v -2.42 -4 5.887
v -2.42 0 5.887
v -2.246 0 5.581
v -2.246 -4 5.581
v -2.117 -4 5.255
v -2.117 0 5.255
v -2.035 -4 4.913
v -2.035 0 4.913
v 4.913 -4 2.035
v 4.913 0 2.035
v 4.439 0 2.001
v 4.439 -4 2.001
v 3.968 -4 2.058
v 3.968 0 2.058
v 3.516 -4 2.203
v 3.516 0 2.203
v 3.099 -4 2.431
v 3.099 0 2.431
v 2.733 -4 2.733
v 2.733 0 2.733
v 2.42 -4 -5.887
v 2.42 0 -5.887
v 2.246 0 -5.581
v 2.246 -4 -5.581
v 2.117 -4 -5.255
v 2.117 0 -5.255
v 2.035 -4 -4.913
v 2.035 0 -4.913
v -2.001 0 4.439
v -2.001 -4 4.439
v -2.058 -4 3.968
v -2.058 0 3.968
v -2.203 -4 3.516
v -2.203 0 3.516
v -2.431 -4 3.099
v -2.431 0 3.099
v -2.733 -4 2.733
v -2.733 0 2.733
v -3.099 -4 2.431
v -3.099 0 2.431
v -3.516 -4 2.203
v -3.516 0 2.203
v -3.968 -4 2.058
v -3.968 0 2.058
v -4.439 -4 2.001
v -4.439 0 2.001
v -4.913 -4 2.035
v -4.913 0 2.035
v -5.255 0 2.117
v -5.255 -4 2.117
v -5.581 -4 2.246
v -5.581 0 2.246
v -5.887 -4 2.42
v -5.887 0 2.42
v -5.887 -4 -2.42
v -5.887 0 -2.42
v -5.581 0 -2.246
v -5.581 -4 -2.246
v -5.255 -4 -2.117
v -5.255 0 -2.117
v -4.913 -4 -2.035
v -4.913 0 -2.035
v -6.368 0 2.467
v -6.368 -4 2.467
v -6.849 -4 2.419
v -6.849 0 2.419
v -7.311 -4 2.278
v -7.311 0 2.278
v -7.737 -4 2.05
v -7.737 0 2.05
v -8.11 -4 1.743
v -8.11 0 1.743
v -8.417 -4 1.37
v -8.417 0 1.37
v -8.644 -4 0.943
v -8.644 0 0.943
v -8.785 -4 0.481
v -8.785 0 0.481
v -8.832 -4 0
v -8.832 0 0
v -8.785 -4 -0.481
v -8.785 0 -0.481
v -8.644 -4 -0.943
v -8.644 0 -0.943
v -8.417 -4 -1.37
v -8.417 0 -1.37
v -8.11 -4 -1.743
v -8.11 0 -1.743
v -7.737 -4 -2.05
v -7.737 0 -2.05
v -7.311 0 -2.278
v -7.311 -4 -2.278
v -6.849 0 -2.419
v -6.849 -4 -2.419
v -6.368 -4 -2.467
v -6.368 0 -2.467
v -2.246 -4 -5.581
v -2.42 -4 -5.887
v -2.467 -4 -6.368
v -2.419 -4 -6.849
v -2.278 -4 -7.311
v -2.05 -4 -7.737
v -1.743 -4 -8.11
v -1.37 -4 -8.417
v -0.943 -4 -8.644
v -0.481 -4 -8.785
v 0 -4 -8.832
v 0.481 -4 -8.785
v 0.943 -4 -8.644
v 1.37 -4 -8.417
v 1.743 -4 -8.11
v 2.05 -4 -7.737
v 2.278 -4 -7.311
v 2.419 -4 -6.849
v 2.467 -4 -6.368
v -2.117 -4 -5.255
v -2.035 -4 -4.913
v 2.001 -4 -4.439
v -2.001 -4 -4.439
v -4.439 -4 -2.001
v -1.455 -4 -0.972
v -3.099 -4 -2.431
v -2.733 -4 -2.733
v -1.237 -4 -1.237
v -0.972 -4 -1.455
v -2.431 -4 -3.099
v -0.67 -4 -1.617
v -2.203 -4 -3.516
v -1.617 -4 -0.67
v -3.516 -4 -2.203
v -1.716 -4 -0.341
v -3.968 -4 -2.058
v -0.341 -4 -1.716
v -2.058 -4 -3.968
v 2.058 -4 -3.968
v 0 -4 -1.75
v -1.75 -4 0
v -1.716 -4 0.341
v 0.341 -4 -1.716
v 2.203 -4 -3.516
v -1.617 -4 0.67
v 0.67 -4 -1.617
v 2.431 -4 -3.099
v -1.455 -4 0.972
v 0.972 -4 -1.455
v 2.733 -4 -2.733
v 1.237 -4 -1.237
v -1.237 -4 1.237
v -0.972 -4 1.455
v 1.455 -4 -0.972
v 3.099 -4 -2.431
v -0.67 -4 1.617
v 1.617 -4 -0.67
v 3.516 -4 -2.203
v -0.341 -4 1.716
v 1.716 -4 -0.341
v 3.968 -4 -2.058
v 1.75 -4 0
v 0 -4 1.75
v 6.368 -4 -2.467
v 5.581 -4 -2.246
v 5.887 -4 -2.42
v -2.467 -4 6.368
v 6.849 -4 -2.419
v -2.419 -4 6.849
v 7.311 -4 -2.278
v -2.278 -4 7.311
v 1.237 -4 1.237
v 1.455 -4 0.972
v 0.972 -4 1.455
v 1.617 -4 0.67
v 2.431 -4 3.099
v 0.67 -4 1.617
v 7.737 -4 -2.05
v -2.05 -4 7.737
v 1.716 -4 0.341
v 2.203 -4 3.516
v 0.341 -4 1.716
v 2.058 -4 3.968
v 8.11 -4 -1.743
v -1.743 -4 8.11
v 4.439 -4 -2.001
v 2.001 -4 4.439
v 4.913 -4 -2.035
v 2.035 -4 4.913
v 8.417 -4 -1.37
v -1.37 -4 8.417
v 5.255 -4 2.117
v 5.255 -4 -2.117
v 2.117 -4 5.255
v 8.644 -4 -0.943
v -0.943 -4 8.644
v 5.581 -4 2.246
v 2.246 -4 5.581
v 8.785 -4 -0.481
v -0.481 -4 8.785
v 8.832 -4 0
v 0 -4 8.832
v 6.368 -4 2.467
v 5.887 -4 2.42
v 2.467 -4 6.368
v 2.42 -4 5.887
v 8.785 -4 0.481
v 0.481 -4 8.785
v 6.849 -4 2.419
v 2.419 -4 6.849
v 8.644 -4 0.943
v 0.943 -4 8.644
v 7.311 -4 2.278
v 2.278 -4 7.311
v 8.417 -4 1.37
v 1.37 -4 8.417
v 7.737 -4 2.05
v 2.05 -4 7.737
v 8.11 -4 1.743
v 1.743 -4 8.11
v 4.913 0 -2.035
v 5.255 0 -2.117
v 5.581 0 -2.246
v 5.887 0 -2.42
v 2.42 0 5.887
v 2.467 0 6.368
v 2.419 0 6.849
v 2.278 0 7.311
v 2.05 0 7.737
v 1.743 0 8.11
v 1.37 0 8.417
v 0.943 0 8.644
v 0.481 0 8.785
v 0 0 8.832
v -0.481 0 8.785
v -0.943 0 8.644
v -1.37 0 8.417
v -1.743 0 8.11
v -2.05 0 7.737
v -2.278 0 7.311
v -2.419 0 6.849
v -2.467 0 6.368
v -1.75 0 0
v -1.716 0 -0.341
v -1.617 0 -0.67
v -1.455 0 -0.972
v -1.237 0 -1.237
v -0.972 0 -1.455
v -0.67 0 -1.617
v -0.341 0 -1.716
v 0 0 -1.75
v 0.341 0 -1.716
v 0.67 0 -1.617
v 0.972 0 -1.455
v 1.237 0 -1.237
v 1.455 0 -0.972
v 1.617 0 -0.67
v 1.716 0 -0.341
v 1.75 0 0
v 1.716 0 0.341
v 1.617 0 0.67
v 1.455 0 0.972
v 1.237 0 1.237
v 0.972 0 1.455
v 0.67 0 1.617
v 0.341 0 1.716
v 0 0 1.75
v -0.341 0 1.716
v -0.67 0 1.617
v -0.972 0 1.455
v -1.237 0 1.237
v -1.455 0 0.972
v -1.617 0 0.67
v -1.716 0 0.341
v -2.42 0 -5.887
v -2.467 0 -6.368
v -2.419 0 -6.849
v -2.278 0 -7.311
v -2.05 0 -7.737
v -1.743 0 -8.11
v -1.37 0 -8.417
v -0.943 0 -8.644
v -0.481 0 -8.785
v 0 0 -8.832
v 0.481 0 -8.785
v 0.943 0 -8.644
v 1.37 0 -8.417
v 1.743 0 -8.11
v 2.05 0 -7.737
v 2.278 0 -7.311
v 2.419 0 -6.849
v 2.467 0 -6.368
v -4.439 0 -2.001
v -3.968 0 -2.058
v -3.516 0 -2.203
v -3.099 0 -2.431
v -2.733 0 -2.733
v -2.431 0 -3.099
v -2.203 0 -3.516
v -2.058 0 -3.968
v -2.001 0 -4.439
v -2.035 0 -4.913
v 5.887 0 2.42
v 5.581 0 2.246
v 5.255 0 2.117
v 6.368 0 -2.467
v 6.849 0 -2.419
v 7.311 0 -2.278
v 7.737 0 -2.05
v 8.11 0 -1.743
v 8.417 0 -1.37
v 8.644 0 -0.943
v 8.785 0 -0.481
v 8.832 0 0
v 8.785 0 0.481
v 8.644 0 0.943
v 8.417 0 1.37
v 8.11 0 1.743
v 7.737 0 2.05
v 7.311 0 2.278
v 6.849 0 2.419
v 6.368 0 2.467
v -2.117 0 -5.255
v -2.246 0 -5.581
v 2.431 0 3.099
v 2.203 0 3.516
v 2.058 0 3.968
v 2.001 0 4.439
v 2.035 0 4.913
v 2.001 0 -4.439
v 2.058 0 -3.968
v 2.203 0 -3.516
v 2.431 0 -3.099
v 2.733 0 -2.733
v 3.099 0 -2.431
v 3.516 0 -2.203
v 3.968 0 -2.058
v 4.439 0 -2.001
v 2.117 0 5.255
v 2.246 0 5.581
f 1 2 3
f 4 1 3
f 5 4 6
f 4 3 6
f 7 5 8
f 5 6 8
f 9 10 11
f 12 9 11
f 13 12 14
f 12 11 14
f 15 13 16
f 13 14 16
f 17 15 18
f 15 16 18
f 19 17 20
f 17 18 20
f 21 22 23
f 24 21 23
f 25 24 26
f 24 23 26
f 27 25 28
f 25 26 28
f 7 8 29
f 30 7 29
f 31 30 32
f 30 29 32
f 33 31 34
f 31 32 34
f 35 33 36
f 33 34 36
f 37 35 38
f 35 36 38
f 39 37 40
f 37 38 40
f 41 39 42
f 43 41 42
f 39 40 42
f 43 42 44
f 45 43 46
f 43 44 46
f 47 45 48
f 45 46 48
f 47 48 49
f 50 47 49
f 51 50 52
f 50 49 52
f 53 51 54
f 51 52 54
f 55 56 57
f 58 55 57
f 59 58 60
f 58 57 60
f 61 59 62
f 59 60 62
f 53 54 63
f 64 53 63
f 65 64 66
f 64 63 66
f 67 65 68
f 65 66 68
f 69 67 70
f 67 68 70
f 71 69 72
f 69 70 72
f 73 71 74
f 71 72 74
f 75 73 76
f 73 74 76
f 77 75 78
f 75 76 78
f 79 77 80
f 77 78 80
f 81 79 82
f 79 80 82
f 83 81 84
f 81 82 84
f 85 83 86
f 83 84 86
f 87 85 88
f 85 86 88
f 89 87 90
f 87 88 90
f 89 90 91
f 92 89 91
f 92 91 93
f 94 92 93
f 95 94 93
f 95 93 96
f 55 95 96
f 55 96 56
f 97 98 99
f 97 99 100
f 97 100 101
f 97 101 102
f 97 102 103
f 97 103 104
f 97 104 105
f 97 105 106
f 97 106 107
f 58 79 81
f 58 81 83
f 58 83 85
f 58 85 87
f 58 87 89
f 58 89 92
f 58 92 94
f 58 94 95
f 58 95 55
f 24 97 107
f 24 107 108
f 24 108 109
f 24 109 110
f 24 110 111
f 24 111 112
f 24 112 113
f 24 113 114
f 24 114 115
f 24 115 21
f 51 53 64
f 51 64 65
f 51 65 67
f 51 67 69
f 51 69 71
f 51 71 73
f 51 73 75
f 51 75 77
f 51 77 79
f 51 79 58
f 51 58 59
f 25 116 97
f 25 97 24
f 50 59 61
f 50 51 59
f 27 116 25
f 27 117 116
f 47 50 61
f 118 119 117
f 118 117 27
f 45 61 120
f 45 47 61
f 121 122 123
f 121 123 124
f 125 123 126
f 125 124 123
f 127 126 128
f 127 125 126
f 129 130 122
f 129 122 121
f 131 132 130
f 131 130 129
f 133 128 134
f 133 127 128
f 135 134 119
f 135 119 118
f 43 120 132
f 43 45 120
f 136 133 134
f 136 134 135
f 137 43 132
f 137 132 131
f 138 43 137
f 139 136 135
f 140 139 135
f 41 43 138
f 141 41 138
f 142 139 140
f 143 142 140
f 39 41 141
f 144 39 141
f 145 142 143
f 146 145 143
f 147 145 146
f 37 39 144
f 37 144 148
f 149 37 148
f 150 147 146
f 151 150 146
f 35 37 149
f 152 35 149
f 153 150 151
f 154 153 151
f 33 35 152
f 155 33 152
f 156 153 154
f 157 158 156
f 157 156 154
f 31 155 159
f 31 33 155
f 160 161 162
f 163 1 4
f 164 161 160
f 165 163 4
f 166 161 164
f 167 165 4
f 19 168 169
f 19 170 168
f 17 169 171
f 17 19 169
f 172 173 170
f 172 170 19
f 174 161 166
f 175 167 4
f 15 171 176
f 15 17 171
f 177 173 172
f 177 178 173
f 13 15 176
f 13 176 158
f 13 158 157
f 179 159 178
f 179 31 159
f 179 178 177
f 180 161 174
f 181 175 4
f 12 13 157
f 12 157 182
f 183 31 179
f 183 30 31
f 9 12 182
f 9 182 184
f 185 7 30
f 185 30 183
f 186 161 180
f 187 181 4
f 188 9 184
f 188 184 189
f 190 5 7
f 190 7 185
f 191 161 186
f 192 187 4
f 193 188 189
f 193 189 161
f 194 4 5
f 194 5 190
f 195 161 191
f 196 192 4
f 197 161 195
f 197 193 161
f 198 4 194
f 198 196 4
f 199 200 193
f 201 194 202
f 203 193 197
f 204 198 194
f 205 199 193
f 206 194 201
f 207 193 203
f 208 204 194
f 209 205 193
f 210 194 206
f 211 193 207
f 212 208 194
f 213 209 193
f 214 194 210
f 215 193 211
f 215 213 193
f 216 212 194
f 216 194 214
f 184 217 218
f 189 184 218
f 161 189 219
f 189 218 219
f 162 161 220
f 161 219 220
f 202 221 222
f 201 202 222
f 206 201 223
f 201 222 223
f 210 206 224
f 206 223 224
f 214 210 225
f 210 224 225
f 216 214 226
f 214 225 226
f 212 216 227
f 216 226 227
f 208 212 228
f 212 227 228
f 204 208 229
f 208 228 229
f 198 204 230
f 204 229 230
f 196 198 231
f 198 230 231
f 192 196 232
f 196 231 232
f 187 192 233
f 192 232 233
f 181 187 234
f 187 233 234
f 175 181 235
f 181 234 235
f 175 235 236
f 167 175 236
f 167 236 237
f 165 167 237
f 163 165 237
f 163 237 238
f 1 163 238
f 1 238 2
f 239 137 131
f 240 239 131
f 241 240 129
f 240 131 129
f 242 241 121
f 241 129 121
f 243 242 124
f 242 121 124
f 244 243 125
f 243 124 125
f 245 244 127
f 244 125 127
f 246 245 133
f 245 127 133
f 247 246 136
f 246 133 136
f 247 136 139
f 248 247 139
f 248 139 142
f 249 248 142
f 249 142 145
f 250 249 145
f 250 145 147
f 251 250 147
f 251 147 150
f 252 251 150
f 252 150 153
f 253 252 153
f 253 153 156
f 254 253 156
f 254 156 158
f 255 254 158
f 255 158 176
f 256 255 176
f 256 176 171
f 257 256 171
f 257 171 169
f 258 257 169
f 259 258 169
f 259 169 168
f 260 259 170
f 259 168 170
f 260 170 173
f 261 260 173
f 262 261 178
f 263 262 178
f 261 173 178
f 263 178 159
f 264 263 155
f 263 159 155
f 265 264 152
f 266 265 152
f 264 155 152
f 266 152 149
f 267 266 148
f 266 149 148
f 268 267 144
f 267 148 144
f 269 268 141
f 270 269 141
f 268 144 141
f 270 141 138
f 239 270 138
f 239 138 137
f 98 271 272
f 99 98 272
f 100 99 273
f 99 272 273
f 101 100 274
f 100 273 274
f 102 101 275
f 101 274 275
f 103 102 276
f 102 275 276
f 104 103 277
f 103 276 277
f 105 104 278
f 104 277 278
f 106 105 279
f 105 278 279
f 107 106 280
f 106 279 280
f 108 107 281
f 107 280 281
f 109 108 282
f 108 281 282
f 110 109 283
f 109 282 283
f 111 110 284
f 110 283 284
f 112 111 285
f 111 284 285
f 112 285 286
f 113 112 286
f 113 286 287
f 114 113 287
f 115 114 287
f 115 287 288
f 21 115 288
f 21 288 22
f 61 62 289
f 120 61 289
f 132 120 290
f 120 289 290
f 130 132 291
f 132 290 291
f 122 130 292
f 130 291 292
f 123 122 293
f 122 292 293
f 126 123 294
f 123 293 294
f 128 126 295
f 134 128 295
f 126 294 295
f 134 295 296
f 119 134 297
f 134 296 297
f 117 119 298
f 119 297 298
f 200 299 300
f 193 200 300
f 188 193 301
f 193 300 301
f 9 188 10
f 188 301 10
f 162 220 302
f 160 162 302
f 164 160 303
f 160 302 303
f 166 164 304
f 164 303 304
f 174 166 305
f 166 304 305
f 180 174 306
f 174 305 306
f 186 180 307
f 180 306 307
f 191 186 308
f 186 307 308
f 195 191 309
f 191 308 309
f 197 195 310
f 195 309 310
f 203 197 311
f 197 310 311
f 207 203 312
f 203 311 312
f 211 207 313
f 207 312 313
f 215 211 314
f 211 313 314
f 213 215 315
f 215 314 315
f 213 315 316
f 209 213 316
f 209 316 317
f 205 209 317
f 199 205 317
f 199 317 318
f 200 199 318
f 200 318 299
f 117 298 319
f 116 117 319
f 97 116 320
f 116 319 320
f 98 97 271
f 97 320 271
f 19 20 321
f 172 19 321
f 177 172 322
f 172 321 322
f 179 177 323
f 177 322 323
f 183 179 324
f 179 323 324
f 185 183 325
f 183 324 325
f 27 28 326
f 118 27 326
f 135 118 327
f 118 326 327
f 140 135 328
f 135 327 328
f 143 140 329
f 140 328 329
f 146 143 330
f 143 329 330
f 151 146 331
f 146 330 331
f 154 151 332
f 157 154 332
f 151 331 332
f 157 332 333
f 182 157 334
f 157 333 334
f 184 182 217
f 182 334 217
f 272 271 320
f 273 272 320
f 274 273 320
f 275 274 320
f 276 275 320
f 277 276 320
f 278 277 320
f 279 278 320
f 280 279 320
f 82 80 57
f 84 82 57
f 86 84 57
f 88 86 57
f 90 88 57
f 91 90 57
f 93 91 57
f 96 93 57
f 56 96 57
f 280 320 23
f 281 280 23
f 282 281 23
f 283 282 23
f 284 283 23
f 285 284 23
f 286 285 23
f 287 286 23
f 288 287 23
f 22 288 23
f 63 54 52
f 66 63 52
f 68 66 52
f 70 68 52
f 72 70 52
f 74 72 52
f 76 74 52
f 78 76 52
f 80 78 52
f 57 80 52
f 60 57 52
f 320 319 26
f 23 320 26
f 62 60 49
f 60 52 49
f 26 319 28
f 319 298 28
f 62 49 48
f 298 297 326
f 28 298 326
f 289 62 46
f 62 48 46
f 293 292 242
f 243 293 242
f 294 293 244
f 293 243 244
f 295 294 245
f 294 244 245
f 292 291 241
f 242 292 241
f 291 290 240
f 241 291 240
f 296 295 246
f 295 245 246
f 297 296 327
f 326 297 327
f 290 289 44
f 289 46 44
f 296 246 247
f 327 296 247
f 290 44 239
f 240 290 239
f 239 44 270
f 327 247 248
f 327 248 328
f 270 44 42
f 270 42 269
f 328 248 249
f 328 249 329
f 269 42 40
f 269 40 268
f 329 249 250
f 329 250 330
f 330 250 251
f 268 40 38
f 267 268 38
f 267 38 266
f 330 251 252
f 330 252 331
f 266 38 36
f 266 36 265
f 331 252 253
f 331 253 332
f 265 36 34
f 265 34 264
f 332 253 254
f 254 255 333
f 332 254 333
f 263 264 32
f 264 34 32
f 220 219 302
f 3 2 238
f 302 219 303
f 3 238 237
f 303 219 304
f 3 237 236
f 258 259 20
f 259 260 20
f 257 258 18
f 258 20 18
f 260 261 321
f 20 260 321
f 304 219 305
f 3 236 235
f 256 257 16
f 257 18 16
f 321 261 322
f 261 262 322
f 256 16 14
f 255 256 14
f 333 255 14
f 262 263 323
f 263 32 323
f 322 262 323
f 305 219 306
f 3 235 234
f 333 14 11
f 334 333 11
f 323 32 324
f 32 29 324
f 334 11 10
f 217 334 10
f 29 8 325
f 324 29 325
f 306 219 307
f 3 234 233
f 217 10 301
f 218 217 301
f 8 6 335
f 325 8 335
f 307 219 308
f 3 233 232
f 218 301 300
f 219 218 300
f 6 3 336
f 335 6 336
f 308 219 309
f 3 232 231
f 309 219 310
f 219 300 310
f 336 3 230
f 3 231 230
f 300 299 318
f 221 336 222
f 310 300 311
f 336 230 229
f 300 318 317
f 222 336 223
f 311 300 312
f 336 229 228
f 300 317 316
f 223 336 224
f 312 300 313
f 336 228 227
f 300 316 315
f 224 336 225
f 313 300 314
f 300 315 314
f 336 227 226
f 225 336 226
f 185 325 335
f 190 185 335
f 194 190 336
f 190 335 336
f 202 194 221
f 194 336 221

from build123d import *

# Parameters (mm, degrees)
F1_DEPTH = 4
F2_D     = 3.5


with BuildPart() as f1:
    # F0 (on Front) → F1 (new body)
    with BuildSketch(Plane.XZ):
        with BuildLine():
            ThreePointArc((-5.886911578, 2.4202266574), (-8.8319952599, 0), (-5.886911578, -2.4202266574))
            ThreePointArc((-5.886911578, -2.4202266574), (-6.365, 0), (-5.886911578, 2.4202266574))
        make_face()
        with BuildLine():
            ThreePointArc((-5.886911578, -2.4202266574), (-5.4202243386, -2.1759682794), (-4.9127177697, -2.0349143283))
            ThreePointArc((-4.9127177697, -2.0349143283), (-4.142309561, -1.1443981878), (-3.865, 0))
            ThreePointArc((-3.865, 0), (-4.142309561, 1.1443981878), (-4.9127177697, 2.0349143283))
            ThreePointArc((-4.9127177697, 2.0349143283), (-5.4202243386, 2.1759682794), (-5.886911578, 2.4202266574))
            ThreePointArc((-5.886911578, 2.4202266574), (-6.365, 0), (-5.886911578, -2.4202266574))
        make_face()
        with BuildLine():
            ThreePointArc((4.9127177697, -2.0349143283), (3.865, 0), (4.9127177697, 2.0349143283))
            ThreePointArc((4.9127177697, 2.0349143283), (3.7382668993, 2.1198434614), (2.7329677093, 2.7329677093))
            ThreePointArc((2.7329677093, 2.7329677093), (2.1198434614, 3.7382668993), (2.0349143283, 4.9127177697))
            ThreePointArc((2.0349143283, 4.9127177697), (0, 3.865), (-2.0349143283, 4.9127177697))
            ThreePointArc((-2.0349143283, 4.9127177697), (-2.7329677093, 2.7329677093), (-4.9127177697, 2.0349143283))
            ThreePointArc((-4.9127177697, 2.0349143283), (-4.142309561, 1.1443981878), (-3.865, 0))
            ThreePointArc((-3.865, 0), (-4.142309561, -1.1443981878), (-4.9127177697, -2.0349143283))
            ThreePointArc((-4.9127177697, -2.0349143283), (-2.7329677093, -2.7329677093), (-2.0349143283, -4.9127177697))
            ThreePointArc((-2.0349143283, -4.9127177697), (0, -3.865), (2.0349143283, -4.9127177697))
            ThreePointArc((2.0349143283, -4.9127177697), (2.7329677093, -2.7329677093), (4.9127177697, -2.0349143283))
        make_face()
        with BuildLine():
            ThreePointArc((-2.0349143283, 4.9127177697), (0, 3.865), (2.0349143283, 4.9127177697))
            ThreePointArc((2.0349143283, 4.9127177697), (2.1759682794, 5.4202243386), (2.4202266574, 5.886911578))
            ThreePointArc((2.4202266574, 5.886911578), (0, 6.365), (-2.4202266574, 5.886911578))
            ThreePointArc((-2.4202266574, 5.886911578), (-2.1759682794, 5.4202243386), (-2.0349143283, 4.9127177697))
        make_face()
        with BuildLine():
            ThreePointArc((-2.4202266574, 5.886911578), (0, 6.365), (2.4202266574, 5.886911578))
            ThreePointArc((2.4202266574, 5.886911578), (0, 8.8319952599), (-2.4202266574, 5.886911578))
        make_face()
        with BuildLine():
            ThreePointArc((5.886911578, -2.4202266574), (6.2443341196, -1.23349763), (6.365, 0))
            ThreePointArc((6.365, 0), (6.2443341196, 1.23349763), (5.886911578, 2.4202266574))
            ThreePointArc((5.886911578, 2.4202266574), (5.4202243386, 2.1759682794), (4.9127177697, 2.0349143283))
            ThreePointArc((4.9127177697, 2.0349143283), (3.865, 0), (4.9127177697, -2.0349143283))
            ThreePointArc((4.9127177697, -2.0349143283), (5.4202243386, -2.1759682794), (5.886911578, -2.4202266574))
        make_face()
        with BuildLine():
            ThreePointArc((5.886911578, 2.4202266574), (6.2443341196, 1.23349763), (6.365, 0))
            ThreePointArc((6.365, 0), (6.2443341196, -1.23349763), (5.886911578, -2.4202266574))
            ThreePointArc((5.886911578, -2.4202266574), (8.8319952599, 0), (5.886911578, 2.4202266574))
        make_face()
        with BuildLine():
            ThreePointArc((2.4202266574, -5.886911578), (2.1759682794, -5.4202243386), (2.0349143283, -4.9127177697))
            ThreePointArc((2.0349143283, -4.9127177697), (0, -3.865), (-2.0349143283, -4.9127177697))
            ThreePointArc((-2.0349143283, -4.9127177697), (-2.1759682794, -5.4202243386), (-2.4202266574, -5.886911578))
            ThreePointArc((-2.4202266574, -5.886911578), (0, -6.365), (2.4202266574, -5.886911578))
        make_face()
        with BuildLine():
            ThreePointArc((-2.4202266574, -5.886911578), (0, -8.8319952599), (2.4202266574, -5.886911578))
            ThreePointArc((2.4202266574, -5.886911578), (0, -6.365), (-2.4202266574, -5.886911578))
        make_face()
    extrude(amount=F1_DEPTH)

    # F2 (through all)
    with Locations(Plane(origin=(0, 0, 0), x_dir=(1, 0, 0), z_dir=(0, 1, 0))):
        with Locations((0, 0)):
            Hole(F2_D / 2)


solid = f1.part
